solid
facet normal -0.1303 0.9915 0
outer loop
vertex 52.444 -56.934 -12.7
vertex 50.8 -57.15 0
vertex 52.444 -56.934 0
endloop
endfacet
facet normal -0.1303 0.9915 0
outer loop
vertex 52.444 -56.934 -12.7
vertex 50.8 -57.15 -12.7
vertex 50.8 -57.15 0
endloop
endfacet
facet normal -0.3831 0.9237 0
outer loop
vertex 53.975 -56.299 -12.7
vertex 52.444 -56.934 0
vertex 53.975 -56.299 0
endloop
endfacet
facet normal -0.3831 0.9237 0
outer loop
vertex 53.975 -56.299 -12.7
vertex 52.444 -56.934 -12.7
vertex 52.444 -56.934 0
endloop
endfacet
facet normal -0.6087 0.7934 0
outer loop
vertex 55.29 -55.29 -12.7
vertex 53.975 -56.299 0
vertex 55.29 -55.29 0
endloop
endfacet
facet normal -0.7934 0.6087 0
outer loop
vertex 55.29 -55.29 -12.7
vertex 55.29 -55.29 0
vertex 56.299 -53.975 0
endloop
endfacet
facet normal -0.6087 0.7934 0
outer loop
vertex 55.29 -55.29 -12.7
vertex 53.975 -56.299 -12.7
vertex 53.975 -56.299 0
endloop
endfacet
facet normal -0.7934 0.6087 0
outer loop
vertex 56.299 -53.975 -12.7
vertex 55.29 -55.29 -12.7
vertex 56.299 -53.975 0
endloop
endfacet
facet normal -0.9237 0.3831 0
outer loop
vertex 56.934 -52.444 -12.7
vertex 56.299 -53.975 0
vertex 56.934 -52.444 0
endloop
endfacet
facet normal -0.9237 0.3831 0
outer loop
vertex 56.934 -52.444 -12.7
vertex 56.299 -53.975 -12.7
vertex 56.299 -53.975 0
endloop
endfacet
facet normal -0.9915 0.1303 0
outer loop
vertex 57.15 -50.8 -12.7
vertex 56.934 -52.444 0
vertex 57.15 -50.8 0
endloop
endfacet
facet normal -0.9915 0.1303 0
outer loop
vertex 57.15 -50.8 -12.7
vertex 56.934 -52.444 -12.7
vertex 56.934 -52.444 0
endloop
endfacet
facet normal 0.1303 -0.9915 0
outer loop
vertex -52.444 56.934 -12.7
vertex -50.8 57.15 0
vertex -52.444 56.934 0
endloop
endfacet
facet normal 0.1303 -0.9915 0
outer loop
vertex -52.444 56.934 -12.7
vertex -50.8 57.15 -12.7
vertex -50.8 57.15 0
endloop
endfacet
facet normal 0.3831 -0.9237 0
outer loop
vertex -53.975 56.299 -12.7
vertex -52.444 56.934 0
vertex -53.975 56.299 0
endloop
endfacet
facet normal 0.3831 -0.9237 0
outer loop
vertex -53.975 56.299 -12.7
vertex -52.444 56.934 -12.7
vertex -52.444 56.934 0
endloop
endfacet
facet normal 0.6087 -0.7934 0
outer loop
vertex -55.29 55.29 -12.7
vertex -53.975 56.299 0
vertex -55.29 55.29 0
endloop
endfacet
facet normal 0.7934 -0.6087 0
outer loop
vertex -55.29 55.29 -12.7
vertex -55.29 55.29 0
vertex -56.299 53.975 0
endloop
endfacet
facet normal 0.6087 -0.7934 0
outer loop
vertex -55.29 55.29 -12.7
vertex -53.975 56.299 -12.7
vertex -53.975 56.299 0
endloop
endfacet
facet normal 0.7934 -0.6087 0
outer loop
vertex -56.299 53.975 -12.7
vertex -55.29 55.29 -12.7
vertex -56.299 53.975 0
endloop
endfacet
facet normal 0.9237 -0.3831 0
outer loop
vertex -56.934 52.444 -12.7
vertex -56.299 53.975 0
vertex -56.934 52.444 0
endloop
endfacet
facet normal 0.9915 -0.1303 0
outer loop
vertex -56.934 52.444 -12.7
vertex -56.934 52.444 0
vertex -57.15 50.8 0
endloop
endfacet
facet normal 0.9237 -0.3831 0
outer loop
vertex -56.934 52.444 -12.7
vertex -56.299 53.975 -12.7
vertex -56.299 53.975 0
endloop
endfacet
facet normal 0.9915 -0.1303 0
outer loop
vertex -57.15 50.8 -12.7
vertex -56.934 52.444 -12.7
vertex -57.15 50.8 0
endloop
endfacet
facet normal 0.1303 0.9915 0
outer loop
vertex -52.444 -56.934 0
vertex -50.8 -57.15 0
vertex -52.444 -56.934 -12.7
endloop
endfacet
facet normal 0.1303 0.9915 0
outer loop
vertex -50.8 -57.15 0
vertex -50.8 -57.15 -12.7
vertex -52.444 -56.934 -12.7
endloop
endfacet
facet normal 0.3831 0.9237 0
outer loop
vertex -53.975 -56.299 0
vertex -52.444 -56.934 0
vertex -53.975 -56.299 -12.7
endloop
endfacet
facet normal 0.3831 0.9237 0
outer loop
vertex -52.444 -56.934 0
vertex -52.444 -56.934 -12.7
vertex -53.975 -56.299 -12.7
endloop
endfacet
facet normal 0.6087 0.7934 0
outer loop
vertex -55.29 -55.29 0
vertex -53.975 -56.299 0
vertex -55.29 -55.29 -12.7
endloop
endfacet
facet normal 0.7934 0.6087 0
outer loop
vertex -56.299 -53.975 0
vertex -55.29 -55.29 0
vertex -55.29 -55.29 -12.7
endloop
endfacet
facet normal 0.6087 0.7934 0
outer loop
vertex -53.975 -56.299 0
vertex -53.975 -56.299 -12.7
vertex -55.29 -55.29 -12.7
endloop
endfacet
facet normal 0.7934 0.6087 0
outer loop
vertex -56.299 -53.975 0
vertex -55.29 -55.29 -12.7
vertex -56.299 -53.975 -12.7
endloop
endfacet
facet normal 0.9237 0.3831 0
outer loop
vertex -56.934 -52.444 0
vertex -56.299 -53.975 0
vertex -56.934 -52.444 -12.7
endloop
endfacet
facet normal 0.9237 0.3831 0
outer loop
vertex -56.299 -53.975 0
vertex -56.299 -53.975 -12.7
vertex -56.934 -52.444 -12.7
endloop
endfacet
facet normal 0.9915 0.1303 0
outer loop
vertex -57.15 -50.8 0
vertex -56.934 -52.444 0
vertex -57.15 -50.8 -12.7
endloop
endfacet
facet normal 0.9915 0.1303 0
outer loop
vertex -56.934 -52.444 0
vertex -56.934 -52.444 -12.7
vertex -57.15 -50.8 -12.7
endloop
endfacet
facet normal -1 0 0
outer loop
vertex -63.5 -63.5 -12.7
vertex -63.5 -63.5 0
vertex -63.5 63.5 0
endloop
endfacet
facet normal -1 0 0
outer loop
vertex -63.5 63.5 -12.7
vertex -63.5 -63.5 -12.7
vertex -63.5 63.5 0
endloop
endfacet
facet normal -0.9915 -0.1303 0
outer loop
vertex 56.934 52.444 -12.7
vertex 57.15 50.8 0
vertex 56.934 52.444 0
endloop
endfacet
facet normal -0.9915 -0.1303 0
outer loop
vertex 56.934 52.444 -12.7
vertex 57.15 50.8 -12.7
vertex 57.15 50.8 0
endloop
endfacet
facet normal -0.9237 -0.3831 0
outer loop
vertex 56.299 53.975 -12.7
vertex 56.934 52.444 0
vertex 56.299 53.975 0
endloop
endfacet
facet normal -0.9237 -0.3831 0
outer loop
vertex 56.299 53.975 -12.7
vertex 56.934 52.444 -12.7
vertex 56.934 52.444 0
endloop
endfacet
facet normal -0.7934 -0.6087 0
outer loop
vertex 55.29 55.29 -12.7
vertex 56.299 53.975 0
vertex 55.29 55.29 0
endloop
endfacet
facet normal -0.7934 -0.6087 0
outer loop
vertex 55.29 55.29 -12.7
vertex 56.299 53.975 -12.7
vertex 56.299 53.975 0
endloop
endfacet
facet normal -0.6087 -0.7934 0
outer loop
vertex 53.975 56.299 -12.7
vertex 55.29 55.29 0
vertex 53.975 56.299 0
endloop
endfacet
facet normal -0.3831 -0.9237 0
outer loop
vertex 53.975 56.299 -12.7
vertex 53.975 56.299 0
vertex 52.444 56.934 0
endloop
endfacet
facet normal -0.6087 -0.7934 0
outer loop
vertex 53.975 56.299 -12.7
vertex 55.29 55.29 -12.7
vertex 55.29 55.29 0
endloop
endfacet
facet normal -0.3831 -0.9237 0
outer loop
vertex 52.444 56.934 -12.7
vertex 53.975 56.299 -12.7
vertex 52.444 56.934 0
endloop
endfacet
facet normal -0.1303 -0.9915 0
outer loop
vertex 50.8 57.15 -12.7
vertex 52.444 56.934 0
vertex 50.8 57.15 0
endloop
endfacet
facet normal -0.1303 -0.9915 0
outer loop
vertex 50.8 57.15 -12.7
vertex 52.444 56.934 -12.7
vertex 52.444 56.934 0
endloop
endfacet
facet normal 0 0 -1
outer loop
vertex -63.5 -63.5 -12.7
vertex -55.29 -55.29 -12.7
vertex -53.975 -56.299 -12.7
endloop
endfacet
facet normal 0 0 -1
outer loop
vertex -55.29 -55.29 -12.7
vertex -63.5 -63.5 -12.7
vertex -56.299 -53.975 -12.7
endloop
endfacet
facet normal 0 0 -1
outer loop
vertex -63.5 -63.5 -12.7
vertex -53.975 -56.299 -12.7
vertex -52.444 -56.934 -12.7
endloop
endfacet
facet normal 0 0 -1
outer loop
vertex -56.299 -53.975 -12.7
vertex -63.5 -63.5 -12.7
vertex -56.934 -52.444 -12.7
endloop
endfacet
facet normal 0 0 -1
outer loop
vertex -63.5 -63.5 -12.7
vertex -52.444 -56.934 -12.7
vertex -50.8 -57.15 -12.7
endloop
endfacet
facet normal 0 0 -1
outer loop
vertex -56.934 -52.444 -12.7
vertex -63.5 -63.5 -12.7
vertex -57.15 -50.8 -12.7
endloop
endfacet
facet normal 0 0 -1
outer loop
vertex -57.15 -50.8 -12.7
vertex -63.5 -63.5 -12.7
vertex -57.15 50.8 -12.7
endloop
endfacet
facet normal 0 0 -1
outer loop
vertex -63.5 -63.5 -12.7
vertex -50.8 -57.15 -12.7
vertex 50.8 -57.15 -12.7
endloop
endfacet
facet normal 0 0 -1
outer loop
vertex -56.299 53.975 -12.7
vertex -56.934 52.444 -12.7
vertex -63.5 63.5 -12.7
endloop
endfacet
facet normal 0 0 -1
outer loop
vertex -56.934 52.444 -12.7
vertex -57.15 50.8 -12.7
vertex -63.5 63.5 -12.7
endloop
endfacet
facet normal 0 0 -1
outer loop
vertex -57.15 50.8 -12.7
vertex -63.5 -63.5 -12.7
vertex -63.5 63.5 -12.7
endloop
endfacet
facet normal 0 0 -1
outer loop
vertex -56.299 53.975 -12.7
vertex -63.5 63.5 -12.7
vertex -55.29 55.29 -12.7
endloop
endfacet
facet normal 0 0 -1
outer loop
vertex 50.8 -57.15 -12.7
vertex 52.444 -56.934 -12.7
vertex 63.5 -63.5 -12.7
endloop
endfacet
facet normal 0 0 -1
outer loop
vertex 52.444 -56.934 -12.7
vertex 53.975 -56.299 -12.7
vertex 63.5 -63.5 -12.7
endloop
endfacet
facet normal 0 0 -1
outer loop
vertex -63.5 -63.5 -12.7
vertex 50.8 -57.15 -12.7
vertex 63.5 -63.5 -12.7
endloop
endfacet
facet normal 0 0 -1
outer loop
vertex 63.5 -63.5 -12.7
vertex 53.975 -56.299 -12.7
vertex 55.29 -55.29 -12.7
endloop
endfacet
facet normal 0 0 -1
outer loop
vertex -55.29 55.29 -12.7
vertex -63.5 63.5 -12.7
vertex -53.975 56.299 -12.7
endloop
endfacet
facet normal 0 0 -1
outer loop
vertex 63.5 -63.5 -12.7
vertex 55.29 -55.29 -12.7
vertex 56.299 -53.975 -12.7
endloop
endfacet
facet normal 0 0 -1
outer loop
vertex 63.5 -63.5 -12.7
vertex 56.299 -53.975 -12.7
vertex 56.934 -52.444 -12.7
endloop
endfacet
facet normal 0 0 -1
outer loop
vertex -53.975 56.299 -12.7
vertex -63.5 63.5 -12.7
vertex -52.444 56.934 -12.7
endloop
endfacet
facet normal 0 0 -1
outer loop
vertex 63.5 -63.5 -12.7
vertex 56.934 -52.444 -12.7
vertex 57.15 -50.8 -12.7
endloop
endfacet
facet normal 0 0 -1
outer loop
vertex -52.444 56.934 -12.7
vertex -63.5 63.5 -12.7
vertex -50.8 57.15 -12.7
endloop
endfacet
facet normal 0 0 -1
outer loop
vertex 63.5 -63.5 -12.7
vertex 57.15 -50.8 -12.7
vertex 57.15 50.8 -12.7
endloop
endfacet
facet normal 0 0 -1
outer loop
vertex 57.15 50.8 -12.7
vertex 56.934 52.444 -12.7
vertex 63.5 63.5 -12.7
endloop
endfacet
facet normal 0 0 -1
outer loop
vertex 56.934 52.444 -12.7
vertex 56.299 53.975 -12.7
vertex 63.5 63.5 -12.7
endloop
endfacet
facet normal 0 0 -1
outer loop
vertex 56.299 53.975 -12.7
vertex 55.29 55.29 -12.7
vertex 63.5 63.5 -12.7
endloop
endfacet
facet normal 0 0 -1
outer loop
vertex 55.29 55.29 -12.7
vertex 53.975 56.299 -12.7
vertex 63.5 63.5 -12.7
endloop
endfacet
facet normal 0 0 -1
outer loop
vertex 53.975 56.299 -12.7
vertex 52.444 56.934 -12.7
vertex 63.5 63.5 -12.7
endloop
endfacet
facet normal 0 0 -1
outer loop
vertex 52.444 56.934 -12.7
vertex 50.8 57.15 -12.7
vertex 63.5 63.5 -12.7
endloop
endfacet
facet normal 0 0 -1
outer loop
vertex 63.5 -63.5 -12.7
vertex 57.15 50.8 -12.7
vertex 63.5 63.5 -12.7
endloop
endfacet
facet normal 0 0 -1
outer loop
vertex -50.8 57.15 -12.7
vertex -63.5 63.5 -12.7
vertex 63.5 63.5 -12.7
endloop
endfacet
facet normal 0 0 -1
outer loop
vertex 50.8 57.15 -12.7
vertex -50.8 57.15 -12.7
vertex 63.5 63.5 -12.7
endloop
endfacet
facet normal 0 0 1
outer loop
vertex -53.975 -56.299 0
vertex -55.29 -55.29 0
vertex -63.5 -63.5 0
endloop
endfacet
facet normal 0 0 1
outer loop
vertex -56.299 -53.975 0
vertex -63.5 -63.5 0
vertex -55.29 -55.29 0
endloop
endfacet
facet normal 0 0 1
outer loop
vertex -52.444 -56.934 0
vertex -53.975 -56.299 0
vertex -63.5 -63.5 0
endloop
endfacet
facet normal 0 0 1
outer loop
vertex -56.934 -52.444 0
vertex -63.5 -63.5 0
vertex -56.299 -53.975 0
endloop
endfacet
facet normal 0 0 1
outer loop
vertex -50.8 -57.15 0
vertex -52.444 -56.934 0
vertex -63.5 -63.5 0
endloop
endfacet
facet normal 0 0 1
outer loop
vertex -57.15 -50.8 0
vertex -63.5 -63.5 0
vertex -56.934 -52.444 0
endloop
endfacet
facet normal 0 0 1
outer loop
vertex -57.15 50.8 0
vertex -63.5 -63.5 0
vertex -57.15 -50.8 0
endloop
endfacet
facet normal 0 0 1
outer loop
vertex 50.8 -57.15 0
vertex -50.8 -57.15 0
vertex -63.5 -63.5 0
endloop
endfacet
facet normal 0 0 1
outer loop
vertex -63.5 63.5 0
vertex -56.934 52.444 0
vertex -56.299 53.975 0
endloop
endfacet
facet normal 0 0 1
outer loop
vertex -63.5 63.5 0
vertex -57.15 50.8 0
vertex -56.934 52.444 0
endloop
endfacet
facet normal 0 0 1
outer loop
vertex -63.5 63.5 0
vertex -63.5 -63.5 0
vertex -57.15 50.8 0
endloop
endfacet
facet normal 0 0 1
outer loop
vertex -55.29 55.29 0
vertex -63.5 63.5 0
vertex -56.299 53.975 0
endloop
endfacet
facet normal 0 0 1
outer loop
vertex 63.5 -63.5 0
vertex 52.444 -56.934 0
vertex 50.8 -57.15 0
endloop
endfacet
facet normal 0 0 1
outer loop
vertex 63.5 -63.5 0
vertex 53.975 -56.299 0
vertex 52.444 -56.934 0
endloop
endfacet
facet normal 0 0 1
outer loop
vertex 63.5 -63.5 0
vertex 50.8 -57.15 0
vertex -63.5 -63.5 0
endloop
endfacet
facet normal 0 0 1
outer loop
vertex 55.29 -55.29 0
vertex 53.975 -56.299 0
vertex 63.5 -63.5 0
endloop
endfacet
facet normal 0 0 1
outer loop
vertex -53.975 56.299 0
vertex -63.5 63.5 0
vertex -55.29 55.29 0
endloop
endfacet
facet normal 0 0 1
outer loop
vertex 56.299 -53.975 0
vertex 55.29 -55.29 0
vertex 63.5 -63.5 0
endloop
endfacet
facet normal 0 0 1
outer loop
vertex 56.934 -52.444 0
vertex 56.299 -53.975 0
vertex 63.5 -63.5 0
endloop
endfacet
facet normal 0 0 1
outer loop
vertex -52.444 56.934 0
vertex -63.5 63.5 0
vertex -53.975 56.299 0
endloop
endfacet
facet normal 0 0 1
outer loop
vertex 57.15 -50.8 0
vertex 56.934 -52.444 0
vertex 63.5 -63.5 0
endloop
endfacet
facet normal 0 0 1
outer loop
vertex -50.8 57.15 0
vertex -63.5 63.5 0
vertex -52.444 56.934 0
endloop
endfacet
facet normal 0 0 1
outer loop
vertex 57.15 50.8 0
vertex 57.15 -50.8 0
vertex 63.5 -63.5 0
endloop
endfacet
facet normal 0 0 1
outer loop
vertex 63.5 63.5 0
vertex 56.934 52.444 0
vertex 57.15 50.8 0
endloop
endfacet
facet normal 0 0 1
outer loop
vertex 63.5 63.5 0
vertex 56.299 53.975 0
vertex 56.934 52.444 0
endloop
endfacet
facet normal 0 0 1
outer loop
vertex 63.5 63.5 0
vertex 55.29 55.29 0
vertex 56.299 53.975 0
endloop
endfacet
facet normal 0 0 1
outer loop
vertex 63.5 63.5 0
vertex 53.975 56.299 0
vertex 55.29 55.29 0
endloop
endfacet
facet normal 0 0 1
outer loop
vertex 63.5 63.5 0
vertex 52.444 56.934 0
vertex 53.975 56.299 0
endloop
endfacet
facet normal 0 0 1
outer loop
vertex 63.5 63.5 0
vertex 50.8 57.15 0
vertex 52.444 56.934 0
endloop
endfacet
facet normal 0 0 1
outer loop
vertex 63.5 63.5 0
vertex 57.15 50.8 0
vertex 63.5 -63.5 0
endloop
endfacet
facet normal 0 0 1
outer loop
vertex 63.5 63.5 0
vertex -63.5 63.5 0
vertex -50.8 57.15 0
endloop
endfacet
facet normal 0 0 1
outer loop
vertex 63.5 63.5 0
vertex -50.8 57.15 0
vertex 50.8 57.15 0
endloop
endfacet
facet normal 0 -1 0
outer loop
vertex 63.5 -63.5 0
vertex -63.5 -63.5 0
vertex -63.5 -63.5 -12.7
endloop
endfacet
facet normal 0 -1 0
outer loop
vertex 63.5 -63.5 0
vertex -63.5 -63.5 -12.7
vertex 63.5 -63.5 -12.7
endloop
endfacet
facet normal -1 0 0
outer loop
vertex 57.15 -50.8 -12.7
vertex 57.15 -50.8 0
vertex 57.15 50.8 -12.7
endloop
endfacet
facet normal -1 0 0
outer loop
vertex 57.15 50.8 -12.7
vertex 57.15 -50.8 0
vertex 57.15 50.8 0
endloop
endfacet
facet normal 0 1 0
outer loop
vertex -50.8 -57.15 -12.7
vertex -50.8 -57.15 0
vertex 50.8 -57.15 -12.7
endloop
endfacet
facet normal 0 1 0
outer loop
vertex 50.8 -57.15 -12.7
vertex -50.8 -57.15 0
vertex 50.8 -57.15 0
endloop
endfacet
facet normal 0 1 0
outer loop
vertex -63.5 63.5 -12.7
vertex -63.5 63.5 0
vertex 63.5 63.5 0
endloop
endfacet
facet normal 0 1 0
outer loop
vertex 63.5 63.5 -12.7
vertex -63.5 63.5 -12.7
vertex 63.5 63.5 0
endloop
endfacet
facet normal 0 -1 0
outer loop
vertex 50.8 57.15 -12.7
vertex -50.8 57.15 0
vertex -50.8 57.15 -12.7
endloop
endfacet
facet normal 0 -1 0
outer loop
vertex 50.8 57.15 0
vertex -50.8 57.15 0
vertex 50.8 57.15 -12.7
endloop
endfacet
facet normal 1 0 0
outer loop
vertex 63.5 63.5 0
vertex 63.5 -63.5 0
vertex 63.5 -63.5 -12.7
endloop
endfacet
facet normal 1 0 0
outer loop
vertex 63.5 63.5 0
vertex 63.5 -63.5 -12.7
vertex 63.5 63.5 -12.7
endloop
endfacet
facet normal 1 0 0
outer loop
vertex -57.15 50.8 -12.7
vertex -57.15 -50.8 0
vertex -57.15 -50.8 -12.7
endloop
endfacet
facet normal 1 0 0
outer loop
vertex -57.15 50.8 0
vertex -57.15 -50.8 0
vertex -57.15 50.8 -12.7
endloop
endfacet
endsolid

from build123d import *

# Parameters (mm, degrees)
SKETCH1_W           = 127
SKETCH1_H           = 127
SKETCH1_W_2         = 114.3
SKETCH1_H_2         = 114.3
BOSS_EXTRUDE1_DEPTH = 12.7
FILLET1_R           = 6.35


with BuildPart() as part:
    # Sketch1 → Boss-Extrude1 (new body)
    with BuildSketch(Plane.XY):
        Rectangle(SKETCH1_W, SKETCH1_H)
        Rectangle(SKETCH1_W_2, SKETCH1_H_2, mode=Mode.SUBTRACT)
    extrude(amount=-BOSS_EXTRUDE1_DEPTH)

    # Fillet1
    fillet1_edges = [part.edges().sort_by_distance(p)[0] for p in [
        (57.15, 57.15, -6.35),
        (57.15, -57.15, -6.35),
        (-57.15, -57.15, -6.35),
        (-57.15, 57.15, -6.35),
    ]]
    fillet(fillet1_edges, radius=FILLET1_R)


solid = part.part
